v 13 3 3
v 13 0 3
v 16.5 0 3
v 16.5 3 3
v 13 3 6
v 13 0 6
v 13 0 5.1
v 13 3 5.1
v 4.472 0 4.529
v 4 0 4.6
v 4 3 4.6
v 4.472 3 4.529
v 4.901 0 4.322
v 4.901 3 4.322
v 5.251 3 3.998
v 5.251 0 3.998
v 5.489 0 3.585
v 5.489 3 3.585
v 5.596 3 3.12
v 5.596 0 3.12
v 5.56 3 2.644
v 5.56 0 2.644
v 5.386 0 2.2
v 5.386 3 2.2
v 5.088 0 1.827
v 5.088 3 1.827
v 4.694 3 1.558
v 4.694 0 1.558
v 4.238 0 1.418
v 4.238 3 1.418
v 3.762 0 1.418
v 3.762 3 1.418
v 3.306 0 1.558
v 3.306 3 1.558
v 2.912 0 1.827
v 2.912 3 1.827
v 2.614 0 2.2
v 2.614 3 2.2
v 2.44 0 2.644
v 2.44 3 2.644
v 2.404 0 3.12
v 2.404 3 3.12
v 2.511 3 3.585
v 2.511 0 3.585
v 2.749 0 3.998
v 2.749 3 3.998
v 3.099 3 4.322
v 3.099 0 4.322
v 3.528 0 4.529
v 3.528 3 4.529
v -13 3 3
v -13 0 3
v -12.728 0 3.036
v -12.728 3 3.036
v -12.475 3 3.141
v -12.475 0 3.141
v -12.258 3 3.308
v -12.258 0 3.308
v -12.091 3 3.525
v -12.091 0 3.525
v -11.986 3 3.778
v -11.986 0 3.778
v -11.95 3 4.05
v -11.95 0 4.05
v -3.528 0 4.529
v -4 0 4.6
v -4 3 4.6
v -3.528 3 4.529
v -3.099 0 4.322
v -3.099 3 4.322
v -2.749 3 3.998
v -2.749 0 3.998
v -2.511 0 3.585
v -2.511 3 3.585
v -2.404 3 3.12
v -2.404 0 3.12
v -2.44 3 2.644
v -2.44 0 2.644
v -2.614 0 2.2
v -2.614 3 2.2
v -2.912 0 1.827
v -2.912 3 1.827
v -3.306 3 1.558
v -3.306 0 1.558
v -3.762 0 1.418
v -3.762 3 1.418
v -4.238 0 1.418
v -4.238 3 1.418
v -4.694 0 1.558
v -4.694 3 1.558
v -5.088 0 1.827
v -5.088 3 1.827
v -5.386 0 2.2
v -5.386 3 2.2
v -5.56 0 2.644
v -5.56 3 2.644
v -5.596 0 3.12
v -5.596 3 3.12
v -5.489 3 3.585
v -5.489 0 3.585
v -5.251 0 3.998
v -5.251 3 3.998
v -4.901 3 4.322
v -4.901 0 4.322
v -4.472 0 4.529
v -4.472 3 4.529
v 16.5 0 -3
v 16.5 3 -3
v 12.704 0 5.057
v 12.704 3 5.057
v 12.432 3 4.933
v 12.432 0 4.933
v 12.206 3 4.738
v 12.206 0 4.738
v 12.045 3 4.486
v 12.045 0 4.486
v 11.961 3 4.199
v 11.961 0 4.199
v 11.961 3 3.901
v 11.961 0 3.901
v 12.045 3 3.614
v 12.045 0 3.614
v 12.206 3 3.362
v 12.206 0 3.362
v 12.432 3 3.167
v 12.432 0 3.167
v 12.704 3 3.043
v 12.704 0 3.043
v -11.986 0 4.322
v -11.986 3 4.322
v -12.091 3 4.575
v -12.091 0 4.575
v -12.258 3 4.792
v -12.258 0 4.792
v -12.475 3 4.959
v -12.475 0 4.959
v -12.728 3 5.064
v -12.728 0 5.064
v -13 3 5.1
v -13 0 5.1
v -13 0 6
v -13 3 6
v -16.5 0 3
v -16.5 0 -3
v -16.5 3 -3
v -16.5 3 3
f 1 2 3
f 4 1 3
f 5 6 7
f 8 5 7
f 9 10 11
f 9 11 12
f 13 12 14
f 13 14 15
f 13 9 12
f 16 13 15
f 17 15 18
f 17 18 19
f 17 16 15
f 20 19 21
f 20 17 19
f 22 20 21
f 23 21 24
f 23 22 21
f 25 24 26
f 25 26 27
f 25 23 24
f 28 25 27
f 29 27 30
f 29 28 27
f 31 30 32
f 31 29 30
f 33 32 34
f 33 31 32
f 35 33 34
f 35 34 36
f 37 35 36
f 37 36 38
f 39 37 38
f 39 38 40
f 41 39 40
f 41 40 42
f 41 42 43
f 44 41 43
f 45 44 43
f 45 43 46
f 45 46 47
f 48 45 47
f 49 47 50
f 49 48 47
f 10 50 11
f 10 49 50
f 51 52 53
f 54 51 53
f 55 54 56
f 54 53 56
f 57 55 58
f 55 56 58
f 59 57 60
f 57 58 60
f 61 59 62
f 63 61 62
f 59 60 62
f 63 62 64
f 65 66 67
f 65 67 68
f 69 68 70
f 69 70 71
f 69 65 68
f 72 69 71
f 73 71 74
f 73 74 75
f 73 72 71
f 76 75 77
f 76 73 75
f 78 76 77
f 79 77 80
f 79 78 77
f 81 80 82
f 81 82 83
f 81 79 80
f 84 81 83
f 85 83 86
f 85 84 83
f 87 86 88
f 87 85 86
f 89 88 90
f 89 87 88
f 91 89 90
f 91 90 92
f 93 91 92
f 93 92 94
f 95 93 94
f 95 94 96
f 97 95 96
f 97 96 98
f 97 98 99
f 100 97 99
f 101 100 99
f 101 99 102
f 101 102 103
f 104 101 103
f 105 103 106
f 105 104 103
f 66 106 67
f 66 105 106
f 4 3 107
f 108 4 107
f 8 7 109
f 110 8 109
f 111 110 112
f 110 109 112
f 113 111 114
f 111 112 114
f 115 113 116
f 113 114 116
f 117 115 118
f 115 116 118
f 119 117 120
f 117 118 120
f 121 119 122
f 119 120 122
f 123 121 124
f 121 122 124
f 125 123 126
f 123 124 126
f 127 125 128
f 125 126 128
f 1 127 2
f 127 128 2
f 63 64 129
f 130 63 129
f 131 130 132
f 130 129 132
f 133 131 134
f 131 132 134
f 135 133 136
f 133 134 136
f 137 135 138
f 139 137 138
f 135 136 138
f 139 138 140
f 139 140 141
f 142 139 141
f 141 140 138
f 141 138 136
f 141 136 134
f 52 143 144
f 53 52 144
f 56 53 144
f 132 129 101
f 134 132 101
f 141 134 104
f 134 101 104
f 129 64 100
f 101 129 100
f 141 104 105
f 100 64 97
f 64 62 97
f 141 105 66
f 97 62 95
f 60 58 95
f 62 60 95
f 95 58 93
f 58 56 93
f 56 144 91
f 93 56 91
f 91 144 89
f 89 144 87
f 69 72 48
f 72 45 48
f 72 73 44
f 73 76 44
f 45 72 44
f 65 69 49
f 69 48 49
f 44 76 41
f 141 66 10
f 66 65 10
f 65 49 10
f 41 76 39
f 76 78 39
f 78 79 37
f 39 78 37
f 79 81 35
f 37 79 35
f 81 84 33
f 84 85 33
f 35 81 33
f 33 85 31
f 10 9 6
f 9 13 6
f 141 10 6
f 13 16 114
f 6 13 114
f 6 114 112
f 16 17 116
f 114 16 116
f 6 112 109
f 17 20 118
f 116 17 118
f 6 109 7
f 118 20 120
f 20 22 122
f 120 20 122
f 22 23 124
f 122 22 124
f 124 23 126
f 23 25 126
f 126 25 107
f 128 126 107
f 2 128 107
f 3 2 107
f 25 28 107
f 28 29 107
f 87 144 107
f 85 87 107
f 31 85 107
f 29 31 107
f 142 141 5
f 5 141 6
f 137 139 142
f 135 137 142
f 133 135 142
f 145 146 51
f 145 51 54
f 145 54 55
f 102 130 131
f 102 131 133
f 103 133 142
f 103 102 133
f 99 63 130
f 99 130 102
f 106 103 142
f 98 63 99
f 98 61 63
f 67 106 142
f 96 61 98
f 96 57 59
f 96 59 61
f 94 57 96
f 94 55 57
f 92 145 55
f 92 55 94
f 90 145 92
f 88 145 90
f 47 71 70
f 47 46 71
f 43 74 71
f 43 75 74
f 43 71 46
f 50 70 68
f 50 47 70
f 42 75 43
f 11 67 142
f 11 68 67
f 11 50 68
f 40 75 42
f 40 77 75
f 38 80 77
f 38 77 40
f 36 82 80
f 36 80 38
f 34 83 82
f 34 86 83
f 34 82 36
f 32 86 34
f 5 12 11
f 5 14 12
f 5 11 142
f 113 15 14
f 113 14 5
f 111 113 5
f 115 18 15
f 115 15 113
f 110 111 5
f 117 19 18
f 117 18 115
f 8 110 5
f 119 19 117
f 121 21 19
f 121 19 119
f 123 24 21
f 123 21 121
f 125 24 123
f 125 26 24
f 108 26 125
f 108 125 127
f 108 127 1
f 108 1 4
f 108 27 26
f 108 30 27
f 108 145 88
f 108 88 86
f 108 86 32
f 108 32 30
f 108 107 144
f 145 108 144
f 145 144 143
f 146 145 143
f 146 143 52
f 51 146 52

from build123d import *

# Parameters (mm, degrees)
SKETCH_1_R      = 1.6
EXTRUDE_1_DEPTH = 3


with BuildPart() as part:
    # 草图1 → 凸台-拉伸1 (new body)
    with BuildSketch(Plane(origin=(0, 0, 0), x_dir=(1, 0, 0), z_dir=(0, 1, 0))):
        with BuildLine():
            Line((-13, -6), (13, -6))
            Line((13, -6), (13, -5.1))
            ThreePointArc((13, -5.1), (11.95, -4.05), (13, -3))
            Line((13, -3), (16.5, -3))
            Line((16.5, -3), (16.5, 3))
            Line((16.5, 3), (13, 3))
            Line((13, 3), (-13, 3))
            Line((-13, 3), (-16.5, 3))
            Line((-16.5, 3), (-16.5, -3))
            Line((-16.5, -3), (-13, -3))
            ThreePointArc((-13, -3), (-12.25753788, -3.30753788), (-11.95, -4.05))
            ThreePointArc((-11.95, -4.05), (-12.25753788, -4.79246212), (-13, -5.1))
            Line((-13, -5.1), (-13, -6))
        make_face()
        with Locations(Location((-4, -3, 0), (0, 0, 270))):
            Circle(SKETCH_1_R, mode=Mode.SUBTRACT)
        with Locations(Location((4, -3, 0), (0, 0, 270))):
            Circle(SKETCH_1_R, mode=Mode.SUBTRACT)
    extrude(amount=EXTRUDE_1_DEPTH)


solid = part.part
